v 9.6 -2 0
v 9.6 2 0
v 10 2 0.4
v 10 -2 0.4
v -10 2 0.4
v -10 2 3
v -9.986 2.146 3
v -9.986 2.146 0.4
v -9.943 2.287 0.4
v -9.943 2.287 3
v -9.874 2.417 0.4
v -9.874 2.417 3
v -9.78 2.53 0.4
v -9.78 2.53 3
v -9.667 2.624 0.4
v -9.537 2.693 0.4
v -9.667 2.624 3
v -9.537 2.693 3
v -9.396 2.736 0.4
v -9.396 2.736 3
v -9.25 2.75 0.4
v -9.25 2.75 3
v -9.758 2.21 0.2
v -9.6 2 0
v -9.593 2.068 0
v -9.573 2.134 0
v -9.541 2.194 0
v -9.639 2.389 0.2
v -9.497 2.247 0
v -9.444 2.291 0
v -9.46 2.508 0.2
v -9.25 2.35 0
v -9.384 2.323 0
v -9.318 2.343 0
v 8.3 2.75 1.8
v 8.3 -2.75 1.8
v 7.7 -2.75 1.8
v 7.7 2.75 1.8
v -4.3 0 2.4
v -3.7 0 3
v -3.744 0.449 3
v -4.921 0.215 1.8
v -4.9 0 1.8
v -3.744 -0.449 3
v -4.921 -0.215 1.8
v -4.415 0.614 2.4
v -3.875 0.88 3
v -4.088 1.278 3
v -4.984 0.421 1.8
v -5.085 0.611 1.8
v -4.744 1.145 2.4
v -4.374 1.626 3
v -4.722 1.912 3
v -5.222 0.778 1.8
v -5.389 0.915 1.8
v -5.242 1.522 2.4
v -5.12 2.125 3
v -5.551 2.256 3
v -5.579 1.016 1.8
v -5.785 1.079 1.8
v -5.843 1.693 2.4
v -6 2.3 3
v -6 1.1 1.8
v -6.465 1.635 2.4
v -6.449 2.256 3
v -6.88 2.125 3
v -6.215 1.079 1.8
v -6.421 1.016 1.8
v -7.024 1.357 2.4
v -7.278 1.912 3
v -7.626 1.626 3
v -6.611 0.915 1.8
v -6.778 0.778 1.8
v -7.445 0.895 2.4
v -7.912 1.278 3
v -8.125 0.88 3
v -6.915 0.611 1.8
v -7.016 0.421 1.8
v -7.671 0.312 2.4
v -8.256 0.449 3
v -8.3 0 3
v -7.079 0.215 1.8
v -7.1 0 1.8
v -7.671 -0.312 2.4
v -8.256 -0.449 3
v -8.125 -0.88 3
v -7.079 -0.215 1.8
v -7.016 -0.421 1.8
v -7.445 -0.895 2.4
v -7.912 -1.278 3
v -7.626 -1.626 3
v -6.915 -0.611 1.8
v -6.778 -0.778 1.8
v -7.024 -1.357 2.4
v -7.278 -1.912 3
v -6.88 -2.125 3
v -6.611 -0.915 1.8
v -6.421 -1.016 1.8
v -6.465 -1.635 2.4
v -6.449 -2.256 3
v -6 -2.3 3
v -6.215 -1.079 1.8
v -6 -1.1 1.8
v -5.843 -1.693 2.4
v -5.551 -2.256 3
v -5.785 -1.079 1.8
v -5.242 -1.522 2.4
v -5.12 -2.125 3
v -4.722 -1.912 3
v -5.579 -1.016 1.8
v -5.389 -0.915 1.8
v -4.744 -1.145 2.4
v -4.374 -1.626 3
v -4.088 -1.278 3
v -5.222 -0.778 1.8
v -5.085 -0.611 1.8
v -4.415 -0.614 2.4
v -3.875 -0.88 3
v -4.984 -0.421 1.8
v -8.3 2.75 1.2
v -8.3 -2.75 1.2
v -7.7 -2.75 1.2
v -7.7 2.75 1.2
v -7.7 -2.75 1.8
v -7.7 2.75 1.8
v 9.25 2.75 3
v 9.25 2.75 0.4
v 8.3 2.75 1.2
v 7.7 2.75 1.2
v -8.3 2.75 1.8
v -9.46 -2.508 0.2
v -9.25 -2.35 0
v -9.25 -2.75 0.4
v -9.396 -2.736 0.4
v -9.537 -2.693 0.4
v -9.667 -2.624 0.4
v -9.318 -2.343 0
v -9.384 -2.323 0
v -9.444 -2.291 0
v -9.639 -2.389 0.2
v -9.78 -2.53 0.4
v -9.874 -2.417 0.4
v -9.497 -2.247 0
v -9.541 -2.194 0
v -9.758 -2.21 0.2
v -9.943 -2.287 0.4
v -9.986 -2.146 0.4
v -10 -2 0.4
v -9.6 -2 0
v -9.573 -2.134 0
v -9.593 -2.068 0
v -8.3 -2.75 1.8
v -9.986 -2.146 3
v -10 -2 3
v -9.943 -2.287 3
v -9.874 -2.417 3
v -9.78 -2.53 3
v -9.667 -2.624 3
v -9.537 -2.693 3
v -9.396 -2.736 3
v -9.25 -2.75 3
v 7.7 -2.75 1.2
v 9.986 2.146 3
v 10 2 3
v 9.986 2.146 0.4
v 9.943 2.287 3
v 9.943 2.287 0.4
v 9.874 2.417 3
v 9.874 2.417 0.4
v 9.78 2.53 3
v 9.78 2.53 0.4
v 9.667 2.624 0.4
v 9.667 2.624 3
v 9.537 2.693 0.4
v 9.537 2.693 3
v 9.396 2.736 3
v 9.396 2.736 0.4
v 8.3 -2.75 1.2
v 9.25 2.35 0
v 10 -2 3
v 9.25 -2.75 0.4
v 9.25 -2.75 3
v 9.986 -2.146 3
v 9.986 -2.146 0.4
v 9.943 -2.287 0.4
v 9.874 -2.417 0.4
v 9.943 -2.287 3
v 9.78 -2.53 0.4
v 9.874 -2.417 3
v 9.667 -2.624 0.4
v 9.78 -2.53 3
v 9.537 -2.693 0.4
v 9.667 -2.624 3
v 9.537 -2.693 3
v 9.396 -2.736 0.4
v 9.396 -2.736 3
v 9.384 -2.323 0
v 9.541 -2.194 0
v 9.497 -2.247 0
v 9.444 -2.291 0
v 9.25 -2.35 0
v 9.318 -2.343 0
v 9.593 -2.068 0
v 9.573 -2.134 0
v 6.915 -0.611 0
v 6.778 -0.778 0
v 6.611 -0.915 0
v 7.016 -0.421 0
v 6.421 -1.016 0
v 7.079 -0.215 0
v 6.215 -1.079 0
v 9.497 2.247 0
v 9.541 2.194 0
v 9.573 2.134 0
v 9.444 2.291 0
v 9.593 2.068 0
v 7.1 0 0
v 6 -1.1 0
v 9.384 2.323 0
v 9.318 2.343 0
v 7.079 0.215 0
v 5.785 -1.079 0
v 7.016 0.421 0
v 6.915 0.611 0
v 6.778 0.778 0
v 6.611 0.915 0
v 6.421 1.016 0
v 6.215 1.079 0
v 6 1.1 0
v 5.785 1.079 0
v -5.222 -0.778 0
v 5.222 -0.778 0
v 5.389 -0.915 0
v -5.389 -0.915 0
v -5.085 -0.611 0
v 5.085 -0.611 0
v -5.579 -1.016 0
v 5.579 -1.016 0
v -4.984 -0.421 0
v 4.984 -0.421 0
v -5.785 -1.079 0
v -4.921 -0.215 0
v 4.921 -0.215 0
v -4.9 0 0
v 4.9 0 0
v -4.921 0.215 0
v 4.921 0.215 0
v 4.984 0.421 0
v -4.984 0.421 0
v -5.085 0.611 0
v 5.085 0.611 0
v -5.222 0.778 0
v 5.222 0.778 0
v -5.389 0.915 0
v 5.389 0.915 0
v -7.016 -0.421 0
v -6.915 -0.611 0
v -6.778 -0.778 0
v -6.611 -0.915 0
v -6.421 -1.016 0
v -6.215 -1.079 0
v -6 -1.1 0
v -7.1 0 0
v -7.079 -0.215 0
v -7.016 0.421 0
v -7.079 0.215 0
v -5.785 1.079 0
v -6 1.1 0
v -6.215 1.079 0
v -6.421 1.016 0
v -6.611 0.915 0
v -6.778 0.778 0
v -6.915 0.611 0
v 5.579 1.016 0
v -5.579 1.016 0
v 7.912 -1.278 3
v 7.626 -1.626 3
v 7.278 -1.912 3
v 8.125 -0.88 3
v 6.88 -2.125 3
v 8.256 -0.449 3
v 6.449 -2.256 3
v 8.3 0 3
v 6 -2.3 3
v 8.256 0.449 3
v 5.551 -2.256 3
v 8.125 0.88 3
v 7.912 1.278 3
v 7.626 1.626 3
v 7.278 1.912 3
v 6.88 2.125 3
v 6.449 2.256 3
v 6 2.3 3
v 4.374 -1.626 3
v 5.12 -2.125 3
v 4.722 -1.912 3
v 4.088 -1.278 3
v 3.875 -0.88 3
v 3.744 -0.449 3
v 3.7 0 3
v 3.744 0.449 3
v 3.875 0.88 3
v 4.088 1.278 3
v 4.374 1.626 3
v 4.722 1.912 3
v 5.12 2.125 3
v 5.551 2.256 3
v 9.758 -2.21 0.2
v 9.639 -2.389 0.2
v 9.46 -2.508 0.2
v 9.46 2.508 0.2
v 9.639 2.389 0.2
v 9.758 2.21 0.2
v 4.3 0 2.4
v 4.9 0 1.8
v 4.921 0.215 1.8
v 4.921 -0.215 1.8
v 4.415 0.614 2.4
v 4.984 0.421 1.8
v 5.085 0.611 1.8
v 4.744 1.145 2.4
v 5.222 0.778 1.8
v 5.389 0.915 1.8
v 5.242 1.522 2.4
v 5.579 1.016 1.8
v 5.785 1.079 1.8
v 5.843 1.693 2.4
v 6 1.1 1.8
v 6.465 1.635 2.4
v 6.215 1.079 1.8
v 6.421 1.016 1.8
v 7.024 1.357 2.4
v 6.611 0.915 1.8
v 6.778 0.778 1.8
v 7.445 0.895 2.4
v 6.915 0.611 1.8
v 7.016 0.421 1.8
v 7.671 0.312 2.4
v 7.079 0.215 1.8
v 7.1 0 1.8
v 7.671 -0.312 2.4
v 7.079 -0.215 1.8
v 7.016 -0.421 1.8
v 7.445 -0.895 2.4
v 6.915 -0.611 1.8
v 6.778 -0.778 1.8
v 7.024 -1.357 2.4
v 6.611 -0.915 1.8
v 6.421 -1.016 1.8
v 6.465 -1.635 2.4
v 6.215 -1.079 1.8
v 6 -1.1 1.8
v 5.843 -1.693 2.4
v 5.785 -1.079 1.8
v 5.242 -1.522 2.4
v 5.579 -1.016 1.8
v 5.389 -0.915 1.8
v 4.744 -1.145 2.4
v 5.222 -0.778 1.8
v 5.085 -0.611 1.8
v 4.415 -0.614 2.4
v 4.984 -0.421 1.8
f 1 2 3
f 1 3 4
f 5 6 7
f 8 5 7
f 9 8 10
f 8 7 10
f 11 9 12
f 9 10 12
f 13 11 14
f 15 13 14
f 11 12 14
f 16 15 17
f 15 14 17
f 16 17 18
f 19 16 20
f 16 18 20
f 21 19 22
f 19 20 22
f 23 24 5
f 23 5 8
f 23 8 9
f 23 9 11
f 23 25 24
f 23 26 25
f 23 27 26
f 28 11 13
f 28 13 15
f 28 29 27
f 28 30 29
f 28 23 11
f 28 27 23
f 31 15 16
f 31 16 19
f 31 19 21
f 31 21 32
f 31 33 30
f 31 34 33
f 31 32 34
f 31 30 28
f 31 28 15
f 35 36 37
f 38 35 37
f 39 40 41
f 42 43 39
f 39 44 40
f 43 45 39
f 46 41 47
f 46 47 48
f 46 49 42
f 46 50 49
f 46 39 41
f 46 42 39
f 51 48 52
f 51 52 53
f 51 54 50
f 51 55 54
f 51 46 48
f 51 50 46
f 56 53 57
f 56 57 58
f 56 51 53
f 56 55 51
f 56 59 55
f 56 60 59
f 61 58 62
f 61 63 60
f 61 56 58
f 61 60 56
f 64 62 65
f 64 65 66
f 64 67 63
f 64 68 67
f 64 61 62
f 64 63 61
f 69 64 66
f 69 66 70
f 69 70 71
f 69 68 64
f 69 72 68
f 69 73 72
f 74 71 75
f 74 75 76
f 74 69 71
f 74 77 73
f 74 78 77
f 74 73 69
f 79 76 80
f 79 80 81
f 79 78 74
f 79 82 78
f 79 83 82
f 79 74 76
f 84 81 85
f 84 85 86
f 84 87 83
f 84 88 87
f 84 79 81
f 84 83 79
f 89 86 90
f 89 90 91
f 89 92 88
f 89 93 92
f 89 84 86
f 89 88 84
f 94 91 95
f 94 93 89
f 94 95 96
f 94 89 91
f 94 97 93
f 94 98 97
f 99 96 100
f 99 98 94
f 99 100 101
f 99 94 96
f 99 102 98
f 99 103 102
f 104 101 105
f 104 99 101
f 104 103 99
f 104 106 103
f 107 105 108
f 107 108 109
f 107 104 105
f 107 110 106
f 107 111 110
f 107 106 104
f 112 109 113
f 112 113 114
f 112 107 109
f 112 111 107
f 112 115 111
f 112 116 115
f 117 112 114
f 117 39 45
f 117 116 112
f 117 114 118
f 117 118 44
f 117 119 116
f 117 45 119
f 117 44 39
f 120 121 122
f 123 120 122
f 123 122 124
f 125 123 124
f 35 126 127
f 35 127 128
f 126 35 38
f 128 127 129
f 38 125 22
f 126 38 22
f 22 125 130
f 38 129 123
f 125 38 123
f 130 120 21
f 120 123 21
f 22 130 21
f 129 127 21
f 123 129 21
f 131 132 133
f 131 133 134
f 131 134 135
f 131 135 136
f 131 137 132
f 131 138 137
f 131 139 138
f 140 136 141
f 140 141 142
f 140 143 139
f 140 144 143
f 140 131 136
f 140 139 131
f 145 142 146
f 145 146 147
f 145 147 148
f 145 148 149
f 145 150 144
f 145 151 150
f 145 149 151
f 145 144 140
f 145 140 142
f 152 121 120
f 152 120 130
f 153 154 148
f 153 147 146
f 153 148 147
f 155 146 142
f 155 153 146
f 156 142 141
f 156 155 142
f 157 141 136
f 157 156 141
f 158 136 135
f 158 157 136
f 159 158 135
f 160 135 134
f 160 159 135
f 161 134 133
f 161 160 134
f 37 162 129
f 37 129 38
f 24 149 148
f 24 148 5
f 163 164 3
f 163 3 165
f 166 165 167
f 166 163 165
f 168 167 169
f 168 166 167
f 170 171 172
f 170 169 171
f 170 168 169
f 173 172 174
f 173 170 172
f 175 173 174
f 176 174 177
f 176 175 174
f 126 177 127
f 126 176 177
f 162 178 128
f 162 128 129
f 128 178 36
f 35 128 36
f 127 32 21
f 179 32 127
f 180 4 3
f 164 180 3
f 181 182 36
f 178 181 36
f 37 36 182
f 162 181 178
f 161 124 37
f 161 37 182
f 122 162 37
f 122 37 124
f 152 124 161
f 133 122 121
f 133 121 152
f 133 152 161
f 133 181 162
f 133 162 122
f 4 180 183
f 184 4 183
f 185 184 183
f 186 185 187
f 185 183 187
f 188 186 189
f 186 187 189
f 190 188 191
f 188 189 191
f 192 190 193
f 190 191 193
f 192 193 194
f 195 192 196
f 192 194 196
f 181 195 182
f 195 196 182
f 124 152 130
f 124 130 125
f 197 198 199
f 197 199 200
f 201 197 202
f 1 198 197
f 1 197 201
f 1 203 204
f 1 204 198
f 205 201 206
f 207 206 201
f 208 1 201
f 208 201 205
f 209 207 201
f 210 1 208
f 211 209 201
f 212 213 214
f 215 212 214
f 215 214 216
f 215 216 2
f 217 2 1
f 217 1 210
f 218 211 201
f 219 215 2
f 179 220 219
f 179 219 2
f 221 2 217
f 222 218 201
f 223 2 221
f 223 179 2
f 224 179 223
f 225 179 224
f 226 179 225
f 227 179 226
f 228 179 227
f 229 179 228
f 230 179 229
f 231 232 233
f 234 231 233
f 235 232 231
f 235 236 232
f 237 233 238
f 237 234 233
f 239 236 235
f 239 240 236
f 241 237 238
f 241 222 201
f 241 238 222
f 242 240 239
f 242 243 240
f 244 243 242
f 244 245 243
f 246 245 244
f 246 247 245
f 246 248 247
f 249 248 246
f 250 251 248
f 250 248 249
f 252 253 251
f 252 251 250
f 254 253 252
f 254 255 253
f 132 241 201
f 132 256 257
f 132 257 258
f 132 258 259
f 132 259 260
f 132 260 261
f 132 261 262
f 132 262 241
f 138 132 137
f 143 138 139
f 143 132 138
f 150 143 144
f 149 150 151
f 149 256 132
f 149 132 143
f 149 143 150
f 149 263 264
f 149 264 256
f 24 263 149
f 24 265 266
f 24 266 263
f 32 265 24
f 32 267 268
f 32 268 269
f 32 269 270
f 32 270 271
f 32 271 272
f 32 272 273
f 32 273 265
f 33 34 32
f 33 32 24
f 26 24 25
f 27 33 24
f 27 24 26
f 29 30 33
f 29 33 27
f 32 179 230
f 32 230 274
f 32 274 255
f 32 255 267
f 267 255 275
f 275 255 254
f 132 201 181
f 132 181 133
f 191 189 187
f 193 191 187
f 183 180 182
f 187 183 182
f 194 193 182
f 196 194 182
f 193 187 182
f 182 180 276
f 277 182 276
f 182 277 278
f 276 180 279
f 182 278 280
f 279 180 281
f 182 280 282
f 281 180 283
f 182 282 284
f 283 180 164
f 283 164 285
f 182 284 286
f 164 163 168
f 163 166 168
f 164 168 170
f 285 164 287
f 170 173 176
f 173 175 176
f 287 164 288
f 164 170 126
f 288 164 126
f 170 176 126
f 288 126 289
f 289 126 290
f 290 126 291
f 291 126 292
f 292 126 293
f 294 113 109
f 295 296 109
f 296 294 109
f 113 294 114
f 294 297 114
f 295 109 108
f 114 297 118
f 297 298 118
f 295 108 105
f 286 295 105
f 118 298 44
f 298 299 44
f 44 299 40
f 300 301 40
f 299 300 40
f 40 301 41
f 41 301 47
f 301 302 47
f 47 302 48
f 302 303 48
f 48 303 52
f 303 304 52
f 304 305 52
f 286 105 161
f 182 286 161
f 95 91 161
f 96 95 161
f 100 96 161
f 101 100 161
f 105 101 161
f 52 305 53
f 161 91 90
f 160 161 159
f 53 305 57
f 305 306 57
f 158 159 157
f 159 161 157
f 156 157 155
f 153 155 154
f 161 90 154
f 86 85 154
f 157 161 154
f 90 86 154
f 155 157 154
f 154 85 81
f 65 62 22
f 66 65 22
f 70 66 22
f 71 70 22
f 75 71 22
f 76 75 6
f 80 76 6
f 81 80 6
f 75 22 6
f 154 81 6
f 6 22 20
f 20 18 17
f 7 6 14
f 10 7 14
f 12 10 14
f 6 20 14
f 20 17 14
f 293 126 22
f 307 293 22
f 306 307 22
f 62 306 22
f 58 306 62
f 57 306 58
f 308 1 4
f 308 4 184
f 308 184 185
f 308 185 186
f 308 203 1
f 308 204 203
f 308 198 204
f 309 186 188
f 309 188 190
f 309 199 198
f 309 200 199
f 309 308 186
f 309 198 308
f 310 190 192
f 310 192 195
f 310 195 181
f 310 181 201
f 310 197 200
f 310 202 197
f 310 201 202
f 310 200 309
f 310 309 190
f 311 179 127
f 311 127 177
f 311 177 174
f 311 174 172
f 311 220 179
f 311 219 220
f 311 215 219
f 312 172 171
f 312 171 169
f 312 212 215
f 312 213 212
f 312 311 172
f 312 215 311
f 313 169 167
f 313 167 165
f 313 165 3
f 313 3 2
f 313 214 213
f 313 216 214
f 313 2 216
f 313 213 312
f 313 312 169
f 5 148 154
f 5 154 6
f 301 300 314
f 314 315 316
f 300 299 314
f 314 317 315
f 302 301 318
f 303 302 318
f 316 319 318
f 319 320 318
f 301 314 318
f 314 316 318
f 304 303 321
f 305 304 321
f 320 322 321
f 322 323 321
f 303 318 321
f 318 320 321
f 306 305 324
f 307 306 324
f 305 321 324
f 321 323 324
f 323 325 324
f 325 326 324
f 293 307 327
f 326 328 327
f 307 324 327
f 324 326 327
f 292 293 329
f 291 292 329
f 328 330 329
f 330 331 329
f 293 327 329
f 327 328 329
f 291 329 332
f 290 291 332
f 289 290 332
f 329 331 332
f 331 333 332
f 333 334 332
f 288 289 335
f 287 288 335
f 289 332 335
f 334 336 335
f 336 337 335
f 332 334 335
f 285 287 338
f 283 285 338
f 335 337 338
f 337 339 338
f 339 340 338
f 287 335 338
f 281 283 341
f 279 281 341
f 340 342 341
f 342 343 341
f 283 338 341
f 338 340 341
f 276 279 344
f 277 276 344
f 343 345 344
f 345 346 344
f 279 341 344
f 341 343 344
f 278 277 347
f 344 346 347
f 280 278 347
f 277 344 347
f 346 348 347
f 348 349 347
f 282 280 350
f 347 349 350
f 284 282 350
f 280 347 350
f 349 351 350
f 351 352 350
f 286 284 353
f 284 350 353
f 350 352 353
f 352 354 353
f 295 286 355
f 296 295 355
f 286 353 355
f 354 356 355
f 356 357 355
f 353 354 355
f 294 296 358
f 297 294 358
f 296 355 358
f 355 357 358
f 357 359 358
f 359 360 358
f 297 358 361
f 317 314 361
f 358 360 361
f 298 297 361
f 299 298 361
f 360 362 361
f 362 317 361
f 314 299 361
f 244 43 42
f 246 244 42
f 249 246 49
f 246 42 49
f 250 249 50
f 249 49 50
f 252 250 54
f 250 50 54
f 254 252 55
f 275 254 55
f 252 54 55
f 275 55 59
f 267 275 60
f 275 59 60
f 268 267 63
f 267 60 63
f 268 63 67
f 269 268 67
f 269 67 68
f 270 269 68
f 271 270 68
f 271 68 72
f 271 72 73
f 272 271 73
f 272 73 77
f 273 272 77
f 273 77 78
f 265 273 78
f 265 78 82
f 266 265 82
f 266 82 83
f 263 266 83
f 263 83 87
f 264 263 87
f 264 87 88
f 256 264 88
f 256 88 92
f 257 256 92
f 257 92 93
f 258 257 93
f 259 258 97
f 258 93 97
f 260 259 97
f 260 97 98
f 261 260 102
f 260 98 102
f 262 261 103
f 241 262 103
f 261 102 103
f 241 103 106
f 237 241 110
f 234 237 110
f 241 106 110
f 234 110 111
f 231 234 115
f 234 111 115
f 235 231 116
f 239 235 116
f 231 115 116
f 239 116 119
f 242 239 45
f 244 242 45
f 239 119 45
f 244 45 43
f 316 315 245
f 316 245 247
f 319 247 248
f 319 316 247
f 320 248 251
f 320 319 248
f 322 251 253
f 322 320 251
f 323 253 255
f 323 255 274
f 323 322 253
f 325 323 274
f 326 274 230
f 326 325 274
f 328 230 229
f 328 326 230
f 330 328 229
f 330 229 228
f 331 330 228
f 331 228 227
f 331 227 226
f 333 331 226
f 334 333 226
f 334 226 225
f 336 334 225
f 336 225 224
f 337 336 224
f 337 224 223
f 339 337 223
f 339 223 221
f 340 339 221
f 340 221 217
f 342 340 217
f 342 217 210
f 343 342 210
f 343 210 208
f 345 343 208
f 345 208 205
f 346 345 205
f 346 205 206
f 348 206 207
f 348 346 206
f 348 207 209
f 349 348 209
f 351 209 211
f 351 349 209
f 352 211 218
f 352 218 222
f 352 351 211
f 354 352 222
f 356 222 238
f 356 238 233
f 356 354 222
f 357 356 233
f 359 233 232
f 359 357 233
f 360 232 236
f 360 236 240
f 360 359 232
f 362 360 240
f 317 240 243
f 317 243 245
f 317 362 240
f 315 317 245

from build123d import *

# Parameters (mm, degrees)
SKETCH_W        = 10
SKETCH_H        = 5.5
PAD_DEPTH       = 3
SKETCH001_R     = 1.1
POCKET_DEPTH    = 3.001
SKETCH002_W     = 0.6
SKETCH002_H     = 0.6
POCKET001_DEPTH = 5.501
FILLET_R        = 0.75
CHAMFER_SIZE    = 1.2
CHAMFER001_SIZE = 0.4


with BuildPart() as part:
    # Sketch → Pad (new body)
    with BuildSketch(Plane.XY):
        with Locations((-5, 0)):
            Rectangle(SKETCH_W, SKETCH_H)
    extrude(amount=PAD_DEPTH)

    # Sketch001 (on Face6 of Pad) → Pocket (cut, through all)
    with BuildSketch(Plane.XY.offset(3)):
        with Locations((-6, 0)):
            Circle(SKETCH001_R)
    extrude(amount=-POCKET_DEPTH, mode=Mode.SUBTRACT)

    # Sketch002 (on Face1 of Pocket) → Pocket001 (cut, through all)
    with BuildSketch(Plane.XZ.offset(2.75)):
        with Locations((-8, 1.5)):
            Rectangle(SKETCH002_W, SKETCH002_H)
    extrude(amount=-POCKET001_DEPTH, mode=Mode.SUBTRACT)

    # Fillet
    fillet_edges = [part.edges().sort_by_distance(p)[0] for p in [
        (-10, -2.75, 1.5),
        (-10, 2.75, 1.5),
    ]]
    fillet(fillet_edges, radius=FILLET_R)

    # Mirrored: part across YZ


with BuildPart() as part_1:
    add(part.part)
    add(part.part.mirror(Plane.YZ))

    # Chamfer
    chamfer_edges = [part_1.edges().sort_by_distance(p)[0] for p in [
        (-7.1, 0, 3),
        (7.1, 0, 3),
    ]]
    chamfer(chamfer_edges, length=CHAMFER_SIZE)

    # Chamfer001
    chamfer001_edges = [part_1.edges().sort_by_distance(p)[0] for p in [
        (0, -2.75, 0),
    ]]
    chamfer(chamfer001_edges, length=CHAMFER001_SIZE)


solid = part_1.part
